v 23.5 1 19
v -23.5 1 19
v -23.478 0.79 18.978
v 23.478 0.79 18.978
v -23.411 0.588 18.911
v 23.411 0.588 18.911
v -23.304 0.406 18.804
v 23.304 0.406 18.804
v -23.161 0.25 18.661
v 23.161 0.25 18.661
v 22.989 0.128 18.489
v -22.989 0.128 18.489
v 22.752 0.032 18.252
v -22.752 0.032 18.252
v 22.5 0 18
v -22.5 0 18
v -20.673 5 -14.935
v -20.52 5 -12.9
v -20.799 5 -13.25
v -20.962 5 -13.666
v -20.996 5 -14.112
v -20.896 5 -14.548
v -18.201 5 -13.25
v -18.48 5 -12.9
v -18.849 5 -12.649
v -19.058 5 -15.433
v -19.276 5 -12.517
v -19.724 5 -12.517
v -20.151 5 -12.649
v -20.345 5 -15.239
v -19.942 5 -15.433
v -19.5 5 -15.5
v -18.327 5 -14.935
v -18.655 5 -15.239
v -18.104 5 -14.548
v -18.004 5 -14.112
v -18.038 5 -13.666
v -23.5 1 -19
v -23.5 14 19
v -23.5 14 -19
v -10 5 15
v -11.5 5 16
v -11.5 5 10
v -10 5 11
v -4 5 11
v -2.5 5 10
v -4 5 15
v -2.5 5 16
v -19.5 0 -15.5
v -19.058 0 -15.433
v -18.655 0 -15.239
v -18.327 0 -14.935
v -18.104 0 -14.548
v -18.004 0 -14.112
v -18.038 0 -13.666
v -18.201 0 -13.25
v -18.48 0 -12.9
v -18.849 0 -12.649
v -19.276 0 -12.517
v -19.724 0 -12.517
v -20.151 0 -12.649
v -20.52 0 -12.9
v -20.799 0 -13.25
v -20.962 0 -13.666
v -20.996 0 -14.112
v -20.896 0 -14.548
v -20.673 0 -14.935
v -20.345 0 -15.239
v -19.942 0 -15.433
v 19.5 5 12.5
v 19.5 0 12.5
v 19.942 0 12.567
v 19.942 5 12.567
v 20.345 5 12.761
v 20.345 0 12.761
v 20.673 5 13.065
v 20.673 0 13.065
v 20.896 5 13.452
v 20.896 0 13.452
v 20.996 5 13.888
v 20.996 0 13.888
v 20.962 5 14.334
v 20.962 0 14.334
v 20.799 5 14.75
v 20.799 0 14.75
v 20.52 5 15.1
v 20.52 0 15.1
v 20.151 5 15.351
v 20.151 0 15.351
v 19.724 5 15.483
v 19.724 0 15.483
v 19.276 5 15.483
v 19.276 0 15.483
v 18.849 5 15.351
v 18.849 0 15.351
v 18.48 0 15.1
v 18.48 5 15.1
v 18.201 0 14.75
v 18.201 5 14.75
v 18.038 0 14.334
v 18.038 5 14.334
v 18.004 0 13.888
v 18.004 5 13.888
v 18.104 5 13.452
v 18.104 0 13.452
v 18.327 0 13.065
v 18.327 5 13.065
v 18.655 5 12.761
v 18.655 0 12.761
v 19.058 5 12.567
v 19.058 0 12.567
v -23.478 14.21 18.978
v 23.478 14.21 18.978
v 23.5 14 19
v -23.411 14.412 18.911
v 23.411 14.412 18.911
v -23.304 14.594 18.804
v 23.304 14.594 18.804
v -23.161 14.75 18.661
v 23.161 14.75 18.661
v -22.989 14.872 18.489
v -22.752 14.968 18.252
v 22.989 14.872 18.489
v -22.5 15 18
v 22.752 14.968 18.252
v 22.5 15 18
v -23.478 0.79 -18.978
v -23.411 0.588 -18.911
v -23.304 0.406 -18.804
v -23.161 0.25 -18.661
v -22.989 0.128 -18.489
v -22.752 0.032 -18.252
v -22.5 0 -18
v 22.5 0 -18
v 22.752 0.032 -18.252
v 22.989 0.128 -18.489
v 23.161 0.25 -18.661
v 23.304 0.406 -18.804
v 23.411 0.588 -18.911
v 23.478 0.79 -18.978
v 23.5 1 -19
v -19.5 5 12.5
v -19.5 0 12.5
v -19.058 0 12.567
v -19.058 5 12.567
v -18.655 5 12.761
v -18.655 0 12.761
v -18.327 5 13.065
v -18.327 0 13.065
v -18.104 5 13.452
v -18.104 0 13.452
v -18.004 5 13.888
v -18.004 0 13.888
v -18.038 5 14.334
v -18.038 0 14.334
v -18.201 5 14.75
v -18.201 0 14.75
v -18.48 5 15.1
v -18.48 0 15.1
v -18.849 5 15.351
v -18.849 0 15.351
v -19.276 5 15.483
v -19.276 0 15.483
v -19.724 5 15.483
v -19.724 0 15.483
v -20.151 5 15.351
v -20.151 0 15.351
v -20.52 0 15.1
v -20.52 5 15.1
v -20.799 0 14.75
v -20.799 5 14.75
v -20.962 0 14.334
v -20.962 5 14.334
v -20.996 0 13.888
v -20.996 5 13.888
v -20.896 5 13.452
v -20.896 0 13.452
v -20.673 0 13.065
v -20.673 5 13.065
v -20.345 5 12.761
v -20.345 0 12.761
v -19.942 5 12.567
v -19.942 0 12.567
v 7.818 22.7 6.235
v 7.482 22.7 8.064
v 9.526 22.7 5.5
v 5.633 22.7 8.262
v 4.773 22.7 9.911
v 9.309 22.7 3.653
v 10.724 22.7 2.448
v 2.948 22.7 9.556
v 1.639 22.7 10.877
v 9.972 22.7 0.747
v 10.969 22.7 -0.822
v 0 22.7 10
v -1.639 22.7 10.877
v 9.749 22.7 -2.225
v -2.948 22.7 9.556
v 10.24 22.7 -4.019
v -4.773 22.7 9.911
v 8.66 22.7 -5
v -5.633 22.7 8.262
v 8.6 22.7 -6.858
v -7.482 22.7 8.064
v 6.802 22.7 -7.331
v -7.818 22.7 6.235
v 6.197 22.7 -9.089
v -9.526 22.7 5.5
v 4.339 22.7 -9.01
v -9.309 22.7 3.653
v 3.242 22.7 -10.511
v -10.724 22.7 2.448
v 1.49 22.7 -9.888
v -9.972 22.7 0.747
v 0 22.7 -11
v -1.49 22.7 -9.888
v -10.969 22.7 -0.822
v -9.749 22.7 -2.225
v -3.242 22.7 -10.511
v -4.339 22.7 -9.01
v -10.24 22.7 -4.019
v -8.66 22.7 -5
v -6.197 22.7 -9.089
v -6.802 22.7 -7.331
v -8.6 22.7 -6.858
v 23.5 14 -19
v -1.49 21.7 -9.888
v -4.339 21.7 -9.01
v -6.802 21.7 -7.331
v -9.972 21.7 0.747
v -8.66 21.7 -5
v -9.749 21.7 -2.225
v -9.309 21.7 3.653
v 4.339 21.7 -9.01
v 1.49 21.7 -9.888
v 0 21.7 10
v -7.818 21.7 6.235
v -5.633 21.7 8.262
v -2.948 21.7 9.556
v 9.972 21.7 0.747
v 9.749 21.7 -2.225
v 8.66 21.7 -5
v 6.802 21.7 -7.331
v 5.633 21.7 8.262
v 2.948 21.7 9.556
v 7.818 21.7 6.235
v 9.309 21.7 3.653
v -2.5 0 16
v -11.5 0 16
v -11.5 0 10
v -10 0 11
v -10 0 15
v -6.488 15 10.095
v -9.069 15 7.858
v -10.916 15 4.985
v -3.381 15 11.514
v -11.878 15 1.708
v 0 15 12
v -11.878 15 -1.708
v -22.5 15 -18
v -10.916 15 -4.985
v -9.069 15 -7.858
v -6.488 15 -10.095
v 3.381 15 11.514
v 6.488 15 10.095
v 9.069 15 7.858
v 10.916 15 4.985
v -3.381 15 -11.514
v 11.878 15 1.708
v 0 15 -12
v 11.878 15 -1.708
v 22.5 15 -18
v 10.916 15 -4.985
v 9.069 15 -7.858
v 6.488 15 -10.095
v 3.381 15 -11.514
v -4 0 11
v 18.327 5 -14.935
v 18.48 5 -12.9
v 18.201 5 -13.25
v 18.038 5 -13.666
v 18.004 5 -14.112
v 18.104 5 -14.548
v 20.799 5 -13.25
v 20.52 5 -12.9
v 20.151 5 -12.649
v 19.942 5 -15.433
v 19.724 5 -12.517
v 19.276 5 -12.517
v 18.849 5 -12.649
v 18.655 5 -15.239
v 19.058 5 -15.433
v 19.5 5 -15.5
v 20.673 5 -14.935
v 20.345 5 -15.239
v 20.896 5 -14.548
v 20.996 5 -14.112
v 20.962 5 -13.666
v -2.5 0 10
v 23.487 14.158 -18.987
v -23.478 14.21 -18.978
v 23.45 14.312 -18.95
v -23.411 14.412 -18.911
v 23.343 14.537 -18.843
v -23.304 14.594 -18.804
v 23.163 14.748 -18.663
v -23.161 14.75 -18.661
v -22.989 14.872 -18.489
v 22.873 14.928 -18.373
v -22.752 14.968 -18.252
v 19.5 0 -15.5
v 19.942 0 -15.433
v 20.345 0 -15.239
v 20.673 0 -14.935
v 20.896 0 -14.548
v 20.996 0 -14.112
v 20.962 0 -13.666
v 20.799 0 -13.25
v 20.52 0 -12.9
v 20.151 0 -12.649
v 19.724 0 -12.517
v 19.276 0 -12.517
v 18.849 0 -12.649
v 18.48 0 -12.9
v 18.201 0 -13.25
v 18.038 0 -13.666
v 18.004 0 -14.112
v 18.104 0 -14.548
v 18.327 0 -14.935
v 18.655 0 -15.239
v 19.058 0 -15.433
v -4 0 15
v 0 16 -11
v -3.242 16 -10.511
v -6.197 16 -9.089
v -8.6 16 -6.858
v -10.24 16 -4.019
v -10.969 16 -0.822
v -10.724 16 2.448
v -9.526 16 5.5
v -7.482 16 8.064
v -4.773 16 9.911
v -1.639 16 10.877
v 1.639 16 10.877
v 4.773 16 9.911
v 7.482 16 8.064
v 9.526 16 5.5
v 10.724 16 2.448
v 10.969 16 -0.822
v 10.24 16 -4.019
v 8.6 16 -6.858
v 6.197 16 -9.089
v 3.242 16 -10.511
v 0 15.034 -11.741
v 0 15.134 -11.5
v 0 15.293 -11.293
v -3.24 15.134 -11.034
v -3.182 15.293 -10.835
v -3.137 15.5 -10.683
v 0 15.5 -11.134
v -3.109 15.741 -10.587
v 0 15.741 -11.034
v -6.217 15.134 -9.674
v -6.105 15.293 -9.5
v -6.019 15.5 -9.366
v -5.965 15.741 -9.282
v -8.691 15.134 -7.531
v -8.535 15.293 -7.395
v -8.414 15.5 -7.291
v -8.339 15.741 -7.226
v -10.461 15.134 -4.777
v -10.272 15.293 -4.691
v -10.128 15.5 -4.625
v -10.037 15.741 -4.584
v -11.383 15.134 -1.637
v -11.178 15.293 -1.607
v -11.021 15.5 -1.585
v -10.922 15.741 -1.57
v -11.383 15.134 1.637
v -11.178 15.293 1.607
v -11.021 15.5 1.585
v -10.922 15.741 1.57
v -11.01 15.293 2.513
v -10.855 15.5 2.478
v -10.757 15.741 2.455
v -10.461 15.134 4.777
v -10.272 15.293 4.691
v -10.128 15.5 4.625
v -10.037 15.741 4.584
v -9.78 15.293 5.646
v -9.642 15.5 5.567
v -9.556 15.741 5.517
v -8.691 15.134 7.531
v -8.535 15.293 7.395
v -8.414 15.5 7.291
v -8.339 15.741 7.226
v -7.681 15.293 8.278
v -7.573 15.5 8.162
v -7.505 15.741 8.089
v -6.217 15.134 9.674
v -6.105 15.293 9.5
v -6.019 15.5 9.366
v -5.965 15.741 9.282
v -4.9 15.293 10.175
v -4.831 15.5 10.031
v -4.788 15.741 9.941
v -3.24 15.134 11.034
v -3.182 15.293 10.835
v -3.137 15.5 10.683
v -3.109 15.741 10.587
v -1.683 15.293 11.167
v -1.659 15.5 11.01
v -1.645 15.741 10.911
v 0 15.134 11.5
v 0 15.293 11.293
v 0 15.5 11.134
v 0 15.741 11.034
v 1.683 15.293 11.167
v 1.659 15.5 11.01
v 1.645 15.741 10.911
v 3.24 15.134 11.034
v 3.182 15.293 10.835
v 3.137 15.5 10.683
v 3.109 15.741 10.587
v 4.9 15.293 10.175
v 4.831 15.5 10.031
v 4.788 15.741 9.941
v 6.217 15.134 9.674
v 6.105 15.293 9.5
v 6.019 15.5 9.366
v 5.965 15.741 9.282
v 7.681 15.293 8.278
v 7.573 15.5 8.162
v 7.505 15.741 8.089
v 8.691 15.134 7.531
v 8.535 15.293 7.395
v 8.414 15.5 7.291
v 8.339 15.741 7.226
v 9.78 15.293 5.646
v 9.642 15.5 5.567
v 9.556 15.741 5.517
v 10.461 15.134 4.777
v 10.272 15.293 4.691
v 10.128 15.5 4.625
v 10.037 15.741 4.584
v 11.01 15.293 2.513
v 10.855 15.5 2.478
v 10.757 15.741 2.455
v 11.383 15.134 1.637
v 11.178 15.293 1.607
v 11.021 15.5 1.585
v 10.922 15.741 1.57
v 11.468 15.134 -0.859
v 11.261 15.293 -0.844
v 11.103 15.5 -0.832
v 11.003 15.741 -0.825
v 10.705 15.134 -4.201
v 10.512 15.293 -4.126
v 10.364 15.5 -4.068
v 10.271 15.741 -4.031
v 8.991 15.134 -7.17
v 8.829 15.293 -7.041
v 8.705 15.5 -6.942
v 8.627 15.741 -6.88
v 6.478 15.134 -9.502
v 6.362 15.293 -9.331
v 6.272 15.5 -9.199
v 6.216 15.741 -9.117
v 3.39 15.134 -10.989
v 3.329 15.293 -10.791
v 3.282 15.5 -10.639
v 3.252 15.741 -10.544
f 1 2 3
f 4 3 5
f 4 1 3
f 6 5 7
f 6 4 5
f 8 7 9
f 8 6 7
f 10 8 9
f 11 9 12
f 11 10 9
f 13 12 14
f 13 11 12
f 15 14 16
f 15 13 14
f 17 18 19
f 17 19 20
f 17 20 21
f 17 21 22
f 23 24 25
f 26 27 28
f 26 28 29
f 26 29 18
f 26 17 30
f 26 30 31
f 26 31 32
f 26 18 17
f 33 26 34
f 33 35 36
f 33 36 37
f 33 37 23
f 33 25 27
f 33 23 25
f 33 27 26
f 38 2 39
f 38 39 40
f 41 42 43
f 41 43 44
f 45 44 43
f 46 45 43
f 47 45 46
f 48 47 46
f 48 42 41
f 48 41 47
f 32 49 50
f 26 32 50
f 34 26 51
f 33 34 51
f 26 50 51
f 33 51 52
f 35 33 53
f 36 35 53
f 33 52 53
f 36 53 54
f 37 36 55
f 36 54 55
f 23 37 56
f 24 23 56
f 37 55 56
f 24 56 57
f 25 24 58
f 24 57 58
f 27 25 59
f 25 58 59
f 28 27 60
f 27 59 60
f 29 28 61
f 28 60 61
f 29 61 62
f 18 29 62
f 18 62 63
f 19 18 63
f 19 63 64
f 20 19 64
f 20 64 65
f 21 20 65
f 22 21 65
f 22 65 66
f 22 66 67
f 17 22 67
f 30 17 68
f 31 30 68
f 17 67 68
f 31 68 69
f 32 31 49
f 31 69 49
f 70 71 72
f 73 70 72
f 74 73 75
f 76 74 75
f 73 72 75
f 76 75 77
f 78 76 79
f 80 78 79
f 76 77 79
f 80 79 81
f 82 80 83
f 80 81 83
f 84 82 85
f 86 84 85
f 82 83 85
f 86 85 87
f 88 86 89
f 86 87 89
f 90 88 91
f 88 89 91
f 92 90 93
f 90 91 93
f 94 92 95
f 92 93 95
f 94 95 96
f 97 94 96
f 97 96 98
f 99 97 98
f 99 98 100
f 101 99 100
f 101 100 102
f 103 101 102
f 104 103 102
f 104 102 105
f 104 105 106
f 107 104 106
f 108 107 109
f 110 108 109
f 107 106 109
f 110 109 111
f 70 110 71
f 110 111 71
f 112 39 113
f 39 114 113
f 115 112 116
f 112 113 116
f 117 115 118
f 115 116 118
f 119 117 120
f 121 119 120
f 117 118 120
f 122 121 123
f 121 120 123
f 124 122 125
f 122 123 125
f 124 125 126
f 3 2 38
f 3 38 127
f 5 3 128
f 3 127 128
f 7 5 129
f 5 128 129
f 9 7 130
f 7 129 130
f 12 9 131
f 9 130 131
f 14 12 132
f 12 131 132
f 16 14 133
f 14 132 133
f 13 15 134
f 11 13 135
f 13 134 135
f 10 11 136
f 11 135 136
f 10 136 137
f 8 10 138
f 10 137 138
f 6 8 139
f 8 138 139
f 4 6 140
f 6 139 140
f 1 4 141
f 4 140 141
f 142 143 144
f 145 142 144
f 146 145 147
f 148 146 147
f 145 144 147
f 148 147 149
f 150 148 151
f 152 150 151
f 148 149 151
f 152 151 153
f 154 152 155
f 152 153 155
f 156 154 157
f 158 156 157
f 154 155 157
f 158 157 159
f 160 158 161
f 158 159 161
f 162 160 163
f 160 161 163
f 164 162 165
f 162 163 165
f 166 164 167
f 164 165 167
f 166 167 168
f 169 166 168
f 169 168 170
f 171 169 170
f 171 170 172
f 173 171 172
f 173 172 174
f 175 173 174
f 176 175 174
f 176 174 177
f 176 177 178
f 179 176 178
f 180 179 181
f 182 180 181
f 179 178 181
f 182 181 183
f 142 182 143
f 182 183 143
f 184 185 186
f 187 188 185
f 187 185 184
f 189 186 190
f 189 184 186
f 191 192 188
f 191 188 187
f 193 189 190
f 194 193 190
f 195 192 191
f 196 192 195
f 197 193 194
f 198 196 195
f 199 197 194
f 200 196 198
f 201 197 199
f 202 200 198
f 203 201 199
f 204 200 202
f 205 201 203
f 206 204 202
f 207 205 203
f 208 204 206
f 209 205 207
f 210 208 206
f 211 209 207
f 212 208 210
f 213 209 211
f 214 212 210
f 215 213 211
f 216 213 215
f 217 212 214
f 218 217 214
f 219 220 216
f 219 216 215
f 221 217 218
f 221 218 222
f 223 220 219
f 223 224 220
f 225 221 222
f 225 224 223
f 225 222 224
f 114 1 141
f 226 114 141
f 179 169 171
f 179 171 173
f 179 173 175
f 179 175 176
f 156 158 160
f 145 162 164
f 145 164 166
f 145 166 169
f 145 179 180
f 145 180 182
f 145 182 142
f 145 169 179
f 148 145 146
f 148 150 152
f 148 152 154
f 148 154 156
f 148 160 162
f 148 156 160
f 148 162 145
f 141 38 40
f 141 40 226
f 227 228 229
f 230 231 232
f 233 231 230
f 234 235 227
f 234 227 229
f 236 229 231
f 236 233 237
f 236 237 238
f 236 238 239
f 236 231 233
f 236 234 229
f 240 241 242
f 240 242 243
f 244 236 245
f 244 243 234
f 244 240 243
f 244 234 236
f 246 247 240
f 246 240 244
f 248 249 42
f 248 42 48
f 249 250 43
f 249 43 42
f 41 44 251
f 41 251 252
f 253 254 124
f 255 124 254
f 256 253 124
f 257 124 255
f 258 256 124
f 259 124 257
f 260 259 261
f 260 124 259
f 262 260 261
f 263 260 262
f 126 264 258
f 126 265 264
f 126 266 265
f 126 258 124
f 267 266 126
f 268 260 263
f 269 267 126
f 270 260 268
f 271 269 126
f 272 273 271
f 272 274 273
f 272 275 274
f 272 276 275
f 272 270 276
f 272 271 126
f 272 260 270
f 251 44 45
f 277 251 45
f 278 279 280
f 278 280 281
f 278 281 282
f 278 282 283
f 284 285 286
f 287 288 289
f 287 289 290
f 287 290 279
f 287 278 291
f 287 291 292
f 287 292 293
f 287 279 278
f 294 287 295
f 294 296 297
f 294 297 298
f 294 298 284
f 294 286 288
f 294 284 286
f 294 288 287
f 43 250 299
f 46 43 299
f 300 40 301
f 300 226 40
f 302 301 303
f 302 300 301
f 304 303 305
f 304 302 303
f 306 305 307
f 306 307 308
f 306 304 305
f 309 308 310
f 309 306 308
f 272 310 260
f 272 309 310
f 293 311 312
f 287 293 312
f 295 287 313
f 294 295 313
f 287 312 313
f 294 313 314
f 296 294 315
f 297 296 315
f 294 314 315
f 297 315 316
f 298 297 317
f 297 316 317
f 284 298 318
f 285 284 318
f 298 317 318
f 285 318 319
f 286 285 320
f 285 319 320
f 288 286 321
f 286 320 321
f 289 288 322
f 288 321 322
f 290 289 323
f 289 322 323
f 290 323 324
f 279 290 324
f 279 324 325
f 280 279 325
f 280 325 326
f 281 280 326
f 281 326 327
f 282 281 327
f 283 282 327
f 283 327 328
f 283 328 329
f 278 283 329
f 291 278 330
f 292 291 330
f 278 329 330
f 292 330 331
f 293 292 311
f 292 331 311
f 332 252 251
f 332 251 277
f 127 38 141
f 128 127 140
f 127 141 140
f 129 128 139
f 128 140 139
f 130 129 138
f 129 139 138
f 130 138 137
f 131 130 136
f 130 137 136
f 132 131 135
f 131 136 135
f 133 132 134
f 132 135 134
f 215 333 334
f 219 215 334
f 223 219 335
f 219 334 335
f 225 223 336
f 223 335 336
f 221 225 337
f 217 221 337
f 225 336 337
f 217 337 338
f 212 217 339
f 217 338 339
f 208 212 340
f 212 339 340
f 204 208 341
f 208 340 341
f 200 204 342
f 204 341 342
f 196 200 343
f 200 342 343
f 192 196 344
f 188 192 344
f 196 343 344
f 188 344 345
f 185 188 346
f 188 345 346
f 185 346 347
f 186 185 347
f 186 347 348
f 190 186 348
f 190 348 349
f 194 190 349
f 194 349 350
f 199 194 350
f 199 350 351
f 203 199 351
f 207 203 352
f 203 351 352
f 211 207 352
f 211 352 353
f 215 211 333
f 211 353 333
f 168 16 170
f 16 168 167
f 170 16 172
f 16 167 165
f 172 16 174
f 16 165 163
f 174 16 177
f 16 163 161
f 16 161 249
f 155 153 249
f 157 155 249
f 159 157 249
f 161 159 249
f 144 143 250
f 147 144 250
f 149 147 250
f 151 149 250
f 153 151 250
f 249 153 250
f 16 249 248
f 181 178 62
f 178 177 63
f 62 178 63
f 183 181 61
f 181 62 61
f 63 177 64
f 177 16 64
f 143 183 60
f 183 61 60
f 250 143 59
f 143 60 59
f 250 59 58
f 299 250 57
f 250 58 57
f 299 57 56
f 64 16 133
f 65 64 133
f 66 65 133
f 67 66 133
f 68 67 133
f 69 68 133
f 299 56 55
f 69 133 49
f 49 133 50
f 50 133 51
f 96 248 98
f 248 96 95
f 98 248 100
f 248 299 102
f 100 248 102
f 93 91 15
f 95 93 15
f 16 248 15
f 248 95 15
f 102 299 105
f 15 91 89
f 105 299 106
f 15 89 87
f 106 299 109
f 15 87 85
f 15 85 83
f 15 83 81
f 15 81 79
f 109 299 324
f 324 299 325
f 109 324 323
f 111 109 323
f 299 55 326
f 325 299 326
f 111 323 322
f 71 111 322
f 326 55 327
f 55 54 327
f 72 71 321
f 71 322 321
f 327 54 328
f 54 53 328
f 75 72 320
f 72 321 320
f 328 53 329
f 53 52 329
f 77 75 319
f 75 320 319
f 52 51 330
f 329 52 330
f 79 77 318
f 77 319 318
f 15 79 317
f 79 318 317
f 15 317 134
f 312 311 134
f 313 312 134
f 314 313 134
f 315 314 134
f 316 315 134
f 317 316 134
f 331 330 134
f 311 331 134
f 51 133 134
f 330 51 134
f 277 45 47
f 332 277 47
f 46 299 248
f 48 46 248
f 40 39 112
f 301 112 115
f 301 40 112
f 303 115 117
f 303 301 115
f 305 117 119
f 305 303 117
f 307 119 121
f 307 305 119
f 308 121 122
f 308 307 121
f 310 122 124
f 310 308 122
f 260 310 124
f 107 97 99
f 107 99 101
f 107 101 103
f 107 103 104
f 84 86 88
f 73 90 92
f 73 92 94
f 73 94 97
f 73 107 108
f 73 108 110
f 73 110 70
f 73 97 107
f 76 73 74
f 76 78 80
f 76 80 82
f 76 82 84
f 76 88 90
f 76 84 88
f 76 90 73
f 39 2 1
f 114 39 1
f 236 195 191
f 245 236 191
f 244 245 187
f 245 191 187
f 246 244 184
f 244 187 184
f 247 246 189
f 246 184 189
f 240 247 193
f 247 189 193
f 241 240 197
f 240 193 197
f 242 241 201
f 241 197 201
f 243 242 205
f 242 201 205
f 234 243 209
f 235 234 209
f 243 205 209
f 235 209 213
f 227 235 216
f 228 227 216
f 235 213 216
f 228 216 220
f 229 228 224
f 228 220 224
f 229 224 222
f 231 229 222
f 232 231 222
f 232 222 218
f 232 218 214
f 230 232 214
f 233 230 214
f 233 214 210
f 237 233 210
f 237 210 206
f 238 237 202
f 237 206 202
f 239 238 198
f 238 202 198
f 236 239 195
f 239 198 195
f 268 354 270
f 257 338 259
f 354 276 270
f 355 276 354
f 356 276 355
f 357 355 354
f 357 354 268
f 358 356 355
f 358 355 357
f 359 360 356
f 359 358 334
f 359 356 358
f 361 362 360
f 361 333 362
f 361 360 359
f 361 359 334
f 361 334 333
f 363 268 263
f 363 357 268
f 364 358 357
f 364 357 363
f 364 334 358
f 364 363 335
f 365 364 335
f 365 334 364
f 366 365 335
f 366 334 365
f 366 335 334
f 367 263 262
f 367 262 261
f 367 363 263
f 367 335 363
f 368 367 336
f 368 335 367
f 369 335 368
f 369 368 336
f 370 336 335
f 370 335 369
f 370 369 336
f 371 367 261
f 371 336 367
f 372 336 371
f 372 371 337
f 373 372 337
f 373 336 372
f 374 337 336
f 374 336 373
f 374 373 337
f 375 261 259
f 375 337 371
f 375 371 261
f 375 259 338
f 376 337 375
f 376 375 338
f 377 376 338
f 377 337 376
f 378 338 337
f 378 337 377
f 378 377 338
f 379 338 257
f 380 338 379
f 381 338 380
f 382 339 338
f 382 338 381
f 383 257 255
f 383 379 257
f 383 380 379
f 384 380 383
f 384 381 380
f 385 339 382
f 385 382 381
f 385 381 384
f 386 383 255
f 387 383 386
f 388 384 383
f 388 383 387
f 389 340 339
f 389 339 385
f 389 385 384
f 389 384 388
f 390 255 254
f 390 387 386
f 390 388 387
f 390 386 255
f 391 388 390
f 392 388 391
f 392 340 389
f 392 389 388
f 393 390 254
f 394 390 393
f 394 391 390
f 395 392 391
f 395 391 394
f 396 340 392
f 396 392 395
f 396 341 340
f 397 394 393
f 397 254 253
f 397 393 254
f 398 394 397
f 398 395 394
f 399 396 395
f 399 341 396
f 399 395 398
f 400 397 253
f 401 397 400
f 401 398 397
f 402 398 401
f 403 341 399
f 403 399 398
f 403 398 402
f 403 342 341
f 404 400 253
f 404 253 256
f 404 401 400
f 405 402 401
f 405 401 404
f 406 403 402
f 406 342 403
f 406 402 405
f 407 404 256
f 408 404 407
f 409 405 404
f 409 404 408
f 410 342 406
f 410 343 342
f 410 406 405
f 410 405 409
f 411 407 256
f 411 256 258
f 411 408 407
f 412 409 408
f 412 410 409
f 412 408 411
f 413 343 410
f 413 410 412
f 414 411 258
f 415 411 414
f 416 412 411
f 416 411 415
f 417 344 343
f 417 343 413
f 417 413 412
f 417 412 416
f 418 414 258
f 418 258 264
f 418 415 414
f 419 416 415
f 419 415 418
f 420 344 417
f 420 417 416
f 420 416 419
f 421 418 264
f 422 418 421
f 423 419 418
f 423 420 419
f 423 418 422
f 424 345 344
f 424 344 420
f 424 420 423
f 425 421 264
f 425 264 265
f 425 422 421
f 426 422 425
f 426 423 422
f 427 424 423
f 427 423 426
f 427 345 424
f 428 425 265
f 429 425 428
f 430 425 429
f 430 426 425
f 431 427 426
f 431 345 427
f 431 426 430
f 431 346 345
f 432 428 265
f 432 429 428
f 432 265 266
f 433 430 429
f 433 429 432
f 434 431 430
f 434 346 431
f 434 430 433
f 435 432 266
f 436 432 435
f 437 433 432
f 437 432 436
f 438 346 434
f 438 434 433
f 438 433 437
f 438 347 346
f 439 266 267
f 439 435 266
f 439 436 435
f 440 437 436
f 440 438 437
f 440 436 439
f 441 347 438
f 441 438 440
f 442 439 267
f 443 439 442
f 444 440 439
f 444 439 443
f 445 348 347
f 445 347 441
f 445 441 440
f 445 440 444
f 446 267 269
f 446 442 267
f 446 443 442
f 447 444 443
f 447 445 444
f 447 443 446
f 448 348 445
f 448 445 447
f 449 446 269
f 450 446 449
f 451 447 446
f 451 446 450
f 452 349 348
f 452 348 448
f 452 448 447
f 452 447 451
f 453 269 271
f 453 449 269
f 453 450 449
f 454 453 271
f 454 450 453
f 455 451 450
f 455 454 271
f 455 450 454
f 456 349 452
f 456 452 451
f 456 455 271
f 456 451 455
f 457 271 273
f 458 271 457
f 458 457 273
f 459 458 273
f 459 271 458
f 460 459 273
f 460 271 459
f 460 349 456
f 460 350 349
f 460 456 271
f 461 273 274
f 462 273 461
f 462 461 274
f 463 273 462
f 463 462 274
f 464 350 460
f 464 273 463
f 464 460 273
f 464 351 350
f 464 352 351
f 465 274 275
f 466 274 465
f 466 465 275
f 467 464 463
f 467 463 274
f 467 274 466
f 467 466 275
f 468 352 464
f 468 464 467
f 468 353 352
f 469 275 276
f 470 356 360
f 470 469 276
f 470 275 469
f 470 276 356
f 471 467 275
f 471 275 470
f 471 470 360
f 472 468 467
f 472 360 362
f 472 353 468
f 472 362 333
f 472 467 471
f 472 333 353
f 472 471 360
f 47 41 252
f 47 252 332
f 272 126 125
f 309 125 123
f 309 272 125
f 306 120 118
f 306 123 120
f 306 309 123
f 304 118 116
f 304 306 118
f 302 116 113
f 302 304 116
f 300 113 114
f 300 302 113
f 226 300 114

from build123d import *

# Parameters (mm, degrees)
SKETCH_1_W          = 47
SKETCH_1_H          = 38
EXTRUDE_1_DEPTH     = 15
SKETCH_2_R          = 11
EXTRUDE_2_DEPTH     = 7.7
FILLET_1_R          = 1
SKETCH_3_R          = 1.5
SKETCH_3_W          = 9
SKETCH_3_H          = 6
CUT_EXTRUDE_1_DEPTH = 5
SKETCH_4_W          = 6
SKETCH_4_H          = 4
EXTRUDE_3_DEPTH     = 5
SKETCH_5_R          = 10
CUT_EXTRUDE_2_DEPTH = 1


with BuildPart() as part:
    # 草图1 → 凸台-拉伸1 (new body)
    with BuildSketch(Plane(origin=(0, 0, 0), x_dir=(1, 0, 0), z_dir=(0, 1, 0))):
        Rectangle(SKETCH_1_W, SKETCH_1_H)
    extrude(amount=EXTRUDE_1_DEPTH)

    # 草图2 → 凸台-拉伸2 (add)
    with BuildSketch(Plane(origin=(0, 15, 0), x_dir=(1, 0, 0), z_dir=(0, 1, 0))):
        with Locations(Location((0, 0, 0), (0, 0, 90))):
            Circle(SKETCH_2_R)
    extrude(amount=EXTRUDE_2_DEPTH)

    # 圆角1
    fillet_1_edges = [part.edges().sort_by_distance(p)[0] for p in [
        (-23.5, 15, 0),
        (0, 15, 11),
        (0, 15, 19),
        (23.5, 15, 0),
        (0, 0, 19),
        (-23.5, 0, 0),
        (0, 0, -19),
        (23.5, 0, 0),
        (0, 15, -19),
    ]]
    fillet(fillet_1_edges, radius=FILLET_1_R)

    # 草图3 → 切除-拉伸1 (cut)
    with BuildSketch(Plane.XZ):
        with Locations(Location((19.5, 14, 0), (0, 0, 270))):
            Circle(SKETCH_3_R)
        with Locations(Location((-19.5, 14, 0), (0, 0, 270))):
            Circle(SKETCH_3_R)
        with Locations(Location((-19.5, -14, 0), (0, 0, 270))):
            Circle(SKETCH_3_R)
        with Locations(Location((19.5, -14, 0), (0, 0, 270))):
            Circle(SKETCH_3_R)
        with Locations((-7, 13)):
            Rectangle(SKETCH_3_W, SKETCH_3_H)
    extrude(amount=-CUT_EXTRUDE_1_DEPTH, mode=Mode.SUBTRACT)

    # 草图4 → 凸台-拉伸3 (add)
    with BuildSketch(Plane.XZ.offset(-5)):
        with Locations((-7, 13)):
            Rectangle(SKETCH_4_W, SKETCH_4_H)
    extrude(amount=EXTRUDE_3_DEPTH)

    # 草图5 → 切除-拉伸2 (cut)
    with BuildSketch(Plane(origin=(0, 22.7, 0), x_dir=(1, 0, 0), z_dir=(0, 1, 0))):
        with Locations(Location((0, 0, 0), (0, 0, 270))):
            Circle(SKETCH_5_R)
    extrude(amount=-CUT_EXTRUDE_2_DEPTH, mode=Mode.SUBTRACT)


solid = part.part
